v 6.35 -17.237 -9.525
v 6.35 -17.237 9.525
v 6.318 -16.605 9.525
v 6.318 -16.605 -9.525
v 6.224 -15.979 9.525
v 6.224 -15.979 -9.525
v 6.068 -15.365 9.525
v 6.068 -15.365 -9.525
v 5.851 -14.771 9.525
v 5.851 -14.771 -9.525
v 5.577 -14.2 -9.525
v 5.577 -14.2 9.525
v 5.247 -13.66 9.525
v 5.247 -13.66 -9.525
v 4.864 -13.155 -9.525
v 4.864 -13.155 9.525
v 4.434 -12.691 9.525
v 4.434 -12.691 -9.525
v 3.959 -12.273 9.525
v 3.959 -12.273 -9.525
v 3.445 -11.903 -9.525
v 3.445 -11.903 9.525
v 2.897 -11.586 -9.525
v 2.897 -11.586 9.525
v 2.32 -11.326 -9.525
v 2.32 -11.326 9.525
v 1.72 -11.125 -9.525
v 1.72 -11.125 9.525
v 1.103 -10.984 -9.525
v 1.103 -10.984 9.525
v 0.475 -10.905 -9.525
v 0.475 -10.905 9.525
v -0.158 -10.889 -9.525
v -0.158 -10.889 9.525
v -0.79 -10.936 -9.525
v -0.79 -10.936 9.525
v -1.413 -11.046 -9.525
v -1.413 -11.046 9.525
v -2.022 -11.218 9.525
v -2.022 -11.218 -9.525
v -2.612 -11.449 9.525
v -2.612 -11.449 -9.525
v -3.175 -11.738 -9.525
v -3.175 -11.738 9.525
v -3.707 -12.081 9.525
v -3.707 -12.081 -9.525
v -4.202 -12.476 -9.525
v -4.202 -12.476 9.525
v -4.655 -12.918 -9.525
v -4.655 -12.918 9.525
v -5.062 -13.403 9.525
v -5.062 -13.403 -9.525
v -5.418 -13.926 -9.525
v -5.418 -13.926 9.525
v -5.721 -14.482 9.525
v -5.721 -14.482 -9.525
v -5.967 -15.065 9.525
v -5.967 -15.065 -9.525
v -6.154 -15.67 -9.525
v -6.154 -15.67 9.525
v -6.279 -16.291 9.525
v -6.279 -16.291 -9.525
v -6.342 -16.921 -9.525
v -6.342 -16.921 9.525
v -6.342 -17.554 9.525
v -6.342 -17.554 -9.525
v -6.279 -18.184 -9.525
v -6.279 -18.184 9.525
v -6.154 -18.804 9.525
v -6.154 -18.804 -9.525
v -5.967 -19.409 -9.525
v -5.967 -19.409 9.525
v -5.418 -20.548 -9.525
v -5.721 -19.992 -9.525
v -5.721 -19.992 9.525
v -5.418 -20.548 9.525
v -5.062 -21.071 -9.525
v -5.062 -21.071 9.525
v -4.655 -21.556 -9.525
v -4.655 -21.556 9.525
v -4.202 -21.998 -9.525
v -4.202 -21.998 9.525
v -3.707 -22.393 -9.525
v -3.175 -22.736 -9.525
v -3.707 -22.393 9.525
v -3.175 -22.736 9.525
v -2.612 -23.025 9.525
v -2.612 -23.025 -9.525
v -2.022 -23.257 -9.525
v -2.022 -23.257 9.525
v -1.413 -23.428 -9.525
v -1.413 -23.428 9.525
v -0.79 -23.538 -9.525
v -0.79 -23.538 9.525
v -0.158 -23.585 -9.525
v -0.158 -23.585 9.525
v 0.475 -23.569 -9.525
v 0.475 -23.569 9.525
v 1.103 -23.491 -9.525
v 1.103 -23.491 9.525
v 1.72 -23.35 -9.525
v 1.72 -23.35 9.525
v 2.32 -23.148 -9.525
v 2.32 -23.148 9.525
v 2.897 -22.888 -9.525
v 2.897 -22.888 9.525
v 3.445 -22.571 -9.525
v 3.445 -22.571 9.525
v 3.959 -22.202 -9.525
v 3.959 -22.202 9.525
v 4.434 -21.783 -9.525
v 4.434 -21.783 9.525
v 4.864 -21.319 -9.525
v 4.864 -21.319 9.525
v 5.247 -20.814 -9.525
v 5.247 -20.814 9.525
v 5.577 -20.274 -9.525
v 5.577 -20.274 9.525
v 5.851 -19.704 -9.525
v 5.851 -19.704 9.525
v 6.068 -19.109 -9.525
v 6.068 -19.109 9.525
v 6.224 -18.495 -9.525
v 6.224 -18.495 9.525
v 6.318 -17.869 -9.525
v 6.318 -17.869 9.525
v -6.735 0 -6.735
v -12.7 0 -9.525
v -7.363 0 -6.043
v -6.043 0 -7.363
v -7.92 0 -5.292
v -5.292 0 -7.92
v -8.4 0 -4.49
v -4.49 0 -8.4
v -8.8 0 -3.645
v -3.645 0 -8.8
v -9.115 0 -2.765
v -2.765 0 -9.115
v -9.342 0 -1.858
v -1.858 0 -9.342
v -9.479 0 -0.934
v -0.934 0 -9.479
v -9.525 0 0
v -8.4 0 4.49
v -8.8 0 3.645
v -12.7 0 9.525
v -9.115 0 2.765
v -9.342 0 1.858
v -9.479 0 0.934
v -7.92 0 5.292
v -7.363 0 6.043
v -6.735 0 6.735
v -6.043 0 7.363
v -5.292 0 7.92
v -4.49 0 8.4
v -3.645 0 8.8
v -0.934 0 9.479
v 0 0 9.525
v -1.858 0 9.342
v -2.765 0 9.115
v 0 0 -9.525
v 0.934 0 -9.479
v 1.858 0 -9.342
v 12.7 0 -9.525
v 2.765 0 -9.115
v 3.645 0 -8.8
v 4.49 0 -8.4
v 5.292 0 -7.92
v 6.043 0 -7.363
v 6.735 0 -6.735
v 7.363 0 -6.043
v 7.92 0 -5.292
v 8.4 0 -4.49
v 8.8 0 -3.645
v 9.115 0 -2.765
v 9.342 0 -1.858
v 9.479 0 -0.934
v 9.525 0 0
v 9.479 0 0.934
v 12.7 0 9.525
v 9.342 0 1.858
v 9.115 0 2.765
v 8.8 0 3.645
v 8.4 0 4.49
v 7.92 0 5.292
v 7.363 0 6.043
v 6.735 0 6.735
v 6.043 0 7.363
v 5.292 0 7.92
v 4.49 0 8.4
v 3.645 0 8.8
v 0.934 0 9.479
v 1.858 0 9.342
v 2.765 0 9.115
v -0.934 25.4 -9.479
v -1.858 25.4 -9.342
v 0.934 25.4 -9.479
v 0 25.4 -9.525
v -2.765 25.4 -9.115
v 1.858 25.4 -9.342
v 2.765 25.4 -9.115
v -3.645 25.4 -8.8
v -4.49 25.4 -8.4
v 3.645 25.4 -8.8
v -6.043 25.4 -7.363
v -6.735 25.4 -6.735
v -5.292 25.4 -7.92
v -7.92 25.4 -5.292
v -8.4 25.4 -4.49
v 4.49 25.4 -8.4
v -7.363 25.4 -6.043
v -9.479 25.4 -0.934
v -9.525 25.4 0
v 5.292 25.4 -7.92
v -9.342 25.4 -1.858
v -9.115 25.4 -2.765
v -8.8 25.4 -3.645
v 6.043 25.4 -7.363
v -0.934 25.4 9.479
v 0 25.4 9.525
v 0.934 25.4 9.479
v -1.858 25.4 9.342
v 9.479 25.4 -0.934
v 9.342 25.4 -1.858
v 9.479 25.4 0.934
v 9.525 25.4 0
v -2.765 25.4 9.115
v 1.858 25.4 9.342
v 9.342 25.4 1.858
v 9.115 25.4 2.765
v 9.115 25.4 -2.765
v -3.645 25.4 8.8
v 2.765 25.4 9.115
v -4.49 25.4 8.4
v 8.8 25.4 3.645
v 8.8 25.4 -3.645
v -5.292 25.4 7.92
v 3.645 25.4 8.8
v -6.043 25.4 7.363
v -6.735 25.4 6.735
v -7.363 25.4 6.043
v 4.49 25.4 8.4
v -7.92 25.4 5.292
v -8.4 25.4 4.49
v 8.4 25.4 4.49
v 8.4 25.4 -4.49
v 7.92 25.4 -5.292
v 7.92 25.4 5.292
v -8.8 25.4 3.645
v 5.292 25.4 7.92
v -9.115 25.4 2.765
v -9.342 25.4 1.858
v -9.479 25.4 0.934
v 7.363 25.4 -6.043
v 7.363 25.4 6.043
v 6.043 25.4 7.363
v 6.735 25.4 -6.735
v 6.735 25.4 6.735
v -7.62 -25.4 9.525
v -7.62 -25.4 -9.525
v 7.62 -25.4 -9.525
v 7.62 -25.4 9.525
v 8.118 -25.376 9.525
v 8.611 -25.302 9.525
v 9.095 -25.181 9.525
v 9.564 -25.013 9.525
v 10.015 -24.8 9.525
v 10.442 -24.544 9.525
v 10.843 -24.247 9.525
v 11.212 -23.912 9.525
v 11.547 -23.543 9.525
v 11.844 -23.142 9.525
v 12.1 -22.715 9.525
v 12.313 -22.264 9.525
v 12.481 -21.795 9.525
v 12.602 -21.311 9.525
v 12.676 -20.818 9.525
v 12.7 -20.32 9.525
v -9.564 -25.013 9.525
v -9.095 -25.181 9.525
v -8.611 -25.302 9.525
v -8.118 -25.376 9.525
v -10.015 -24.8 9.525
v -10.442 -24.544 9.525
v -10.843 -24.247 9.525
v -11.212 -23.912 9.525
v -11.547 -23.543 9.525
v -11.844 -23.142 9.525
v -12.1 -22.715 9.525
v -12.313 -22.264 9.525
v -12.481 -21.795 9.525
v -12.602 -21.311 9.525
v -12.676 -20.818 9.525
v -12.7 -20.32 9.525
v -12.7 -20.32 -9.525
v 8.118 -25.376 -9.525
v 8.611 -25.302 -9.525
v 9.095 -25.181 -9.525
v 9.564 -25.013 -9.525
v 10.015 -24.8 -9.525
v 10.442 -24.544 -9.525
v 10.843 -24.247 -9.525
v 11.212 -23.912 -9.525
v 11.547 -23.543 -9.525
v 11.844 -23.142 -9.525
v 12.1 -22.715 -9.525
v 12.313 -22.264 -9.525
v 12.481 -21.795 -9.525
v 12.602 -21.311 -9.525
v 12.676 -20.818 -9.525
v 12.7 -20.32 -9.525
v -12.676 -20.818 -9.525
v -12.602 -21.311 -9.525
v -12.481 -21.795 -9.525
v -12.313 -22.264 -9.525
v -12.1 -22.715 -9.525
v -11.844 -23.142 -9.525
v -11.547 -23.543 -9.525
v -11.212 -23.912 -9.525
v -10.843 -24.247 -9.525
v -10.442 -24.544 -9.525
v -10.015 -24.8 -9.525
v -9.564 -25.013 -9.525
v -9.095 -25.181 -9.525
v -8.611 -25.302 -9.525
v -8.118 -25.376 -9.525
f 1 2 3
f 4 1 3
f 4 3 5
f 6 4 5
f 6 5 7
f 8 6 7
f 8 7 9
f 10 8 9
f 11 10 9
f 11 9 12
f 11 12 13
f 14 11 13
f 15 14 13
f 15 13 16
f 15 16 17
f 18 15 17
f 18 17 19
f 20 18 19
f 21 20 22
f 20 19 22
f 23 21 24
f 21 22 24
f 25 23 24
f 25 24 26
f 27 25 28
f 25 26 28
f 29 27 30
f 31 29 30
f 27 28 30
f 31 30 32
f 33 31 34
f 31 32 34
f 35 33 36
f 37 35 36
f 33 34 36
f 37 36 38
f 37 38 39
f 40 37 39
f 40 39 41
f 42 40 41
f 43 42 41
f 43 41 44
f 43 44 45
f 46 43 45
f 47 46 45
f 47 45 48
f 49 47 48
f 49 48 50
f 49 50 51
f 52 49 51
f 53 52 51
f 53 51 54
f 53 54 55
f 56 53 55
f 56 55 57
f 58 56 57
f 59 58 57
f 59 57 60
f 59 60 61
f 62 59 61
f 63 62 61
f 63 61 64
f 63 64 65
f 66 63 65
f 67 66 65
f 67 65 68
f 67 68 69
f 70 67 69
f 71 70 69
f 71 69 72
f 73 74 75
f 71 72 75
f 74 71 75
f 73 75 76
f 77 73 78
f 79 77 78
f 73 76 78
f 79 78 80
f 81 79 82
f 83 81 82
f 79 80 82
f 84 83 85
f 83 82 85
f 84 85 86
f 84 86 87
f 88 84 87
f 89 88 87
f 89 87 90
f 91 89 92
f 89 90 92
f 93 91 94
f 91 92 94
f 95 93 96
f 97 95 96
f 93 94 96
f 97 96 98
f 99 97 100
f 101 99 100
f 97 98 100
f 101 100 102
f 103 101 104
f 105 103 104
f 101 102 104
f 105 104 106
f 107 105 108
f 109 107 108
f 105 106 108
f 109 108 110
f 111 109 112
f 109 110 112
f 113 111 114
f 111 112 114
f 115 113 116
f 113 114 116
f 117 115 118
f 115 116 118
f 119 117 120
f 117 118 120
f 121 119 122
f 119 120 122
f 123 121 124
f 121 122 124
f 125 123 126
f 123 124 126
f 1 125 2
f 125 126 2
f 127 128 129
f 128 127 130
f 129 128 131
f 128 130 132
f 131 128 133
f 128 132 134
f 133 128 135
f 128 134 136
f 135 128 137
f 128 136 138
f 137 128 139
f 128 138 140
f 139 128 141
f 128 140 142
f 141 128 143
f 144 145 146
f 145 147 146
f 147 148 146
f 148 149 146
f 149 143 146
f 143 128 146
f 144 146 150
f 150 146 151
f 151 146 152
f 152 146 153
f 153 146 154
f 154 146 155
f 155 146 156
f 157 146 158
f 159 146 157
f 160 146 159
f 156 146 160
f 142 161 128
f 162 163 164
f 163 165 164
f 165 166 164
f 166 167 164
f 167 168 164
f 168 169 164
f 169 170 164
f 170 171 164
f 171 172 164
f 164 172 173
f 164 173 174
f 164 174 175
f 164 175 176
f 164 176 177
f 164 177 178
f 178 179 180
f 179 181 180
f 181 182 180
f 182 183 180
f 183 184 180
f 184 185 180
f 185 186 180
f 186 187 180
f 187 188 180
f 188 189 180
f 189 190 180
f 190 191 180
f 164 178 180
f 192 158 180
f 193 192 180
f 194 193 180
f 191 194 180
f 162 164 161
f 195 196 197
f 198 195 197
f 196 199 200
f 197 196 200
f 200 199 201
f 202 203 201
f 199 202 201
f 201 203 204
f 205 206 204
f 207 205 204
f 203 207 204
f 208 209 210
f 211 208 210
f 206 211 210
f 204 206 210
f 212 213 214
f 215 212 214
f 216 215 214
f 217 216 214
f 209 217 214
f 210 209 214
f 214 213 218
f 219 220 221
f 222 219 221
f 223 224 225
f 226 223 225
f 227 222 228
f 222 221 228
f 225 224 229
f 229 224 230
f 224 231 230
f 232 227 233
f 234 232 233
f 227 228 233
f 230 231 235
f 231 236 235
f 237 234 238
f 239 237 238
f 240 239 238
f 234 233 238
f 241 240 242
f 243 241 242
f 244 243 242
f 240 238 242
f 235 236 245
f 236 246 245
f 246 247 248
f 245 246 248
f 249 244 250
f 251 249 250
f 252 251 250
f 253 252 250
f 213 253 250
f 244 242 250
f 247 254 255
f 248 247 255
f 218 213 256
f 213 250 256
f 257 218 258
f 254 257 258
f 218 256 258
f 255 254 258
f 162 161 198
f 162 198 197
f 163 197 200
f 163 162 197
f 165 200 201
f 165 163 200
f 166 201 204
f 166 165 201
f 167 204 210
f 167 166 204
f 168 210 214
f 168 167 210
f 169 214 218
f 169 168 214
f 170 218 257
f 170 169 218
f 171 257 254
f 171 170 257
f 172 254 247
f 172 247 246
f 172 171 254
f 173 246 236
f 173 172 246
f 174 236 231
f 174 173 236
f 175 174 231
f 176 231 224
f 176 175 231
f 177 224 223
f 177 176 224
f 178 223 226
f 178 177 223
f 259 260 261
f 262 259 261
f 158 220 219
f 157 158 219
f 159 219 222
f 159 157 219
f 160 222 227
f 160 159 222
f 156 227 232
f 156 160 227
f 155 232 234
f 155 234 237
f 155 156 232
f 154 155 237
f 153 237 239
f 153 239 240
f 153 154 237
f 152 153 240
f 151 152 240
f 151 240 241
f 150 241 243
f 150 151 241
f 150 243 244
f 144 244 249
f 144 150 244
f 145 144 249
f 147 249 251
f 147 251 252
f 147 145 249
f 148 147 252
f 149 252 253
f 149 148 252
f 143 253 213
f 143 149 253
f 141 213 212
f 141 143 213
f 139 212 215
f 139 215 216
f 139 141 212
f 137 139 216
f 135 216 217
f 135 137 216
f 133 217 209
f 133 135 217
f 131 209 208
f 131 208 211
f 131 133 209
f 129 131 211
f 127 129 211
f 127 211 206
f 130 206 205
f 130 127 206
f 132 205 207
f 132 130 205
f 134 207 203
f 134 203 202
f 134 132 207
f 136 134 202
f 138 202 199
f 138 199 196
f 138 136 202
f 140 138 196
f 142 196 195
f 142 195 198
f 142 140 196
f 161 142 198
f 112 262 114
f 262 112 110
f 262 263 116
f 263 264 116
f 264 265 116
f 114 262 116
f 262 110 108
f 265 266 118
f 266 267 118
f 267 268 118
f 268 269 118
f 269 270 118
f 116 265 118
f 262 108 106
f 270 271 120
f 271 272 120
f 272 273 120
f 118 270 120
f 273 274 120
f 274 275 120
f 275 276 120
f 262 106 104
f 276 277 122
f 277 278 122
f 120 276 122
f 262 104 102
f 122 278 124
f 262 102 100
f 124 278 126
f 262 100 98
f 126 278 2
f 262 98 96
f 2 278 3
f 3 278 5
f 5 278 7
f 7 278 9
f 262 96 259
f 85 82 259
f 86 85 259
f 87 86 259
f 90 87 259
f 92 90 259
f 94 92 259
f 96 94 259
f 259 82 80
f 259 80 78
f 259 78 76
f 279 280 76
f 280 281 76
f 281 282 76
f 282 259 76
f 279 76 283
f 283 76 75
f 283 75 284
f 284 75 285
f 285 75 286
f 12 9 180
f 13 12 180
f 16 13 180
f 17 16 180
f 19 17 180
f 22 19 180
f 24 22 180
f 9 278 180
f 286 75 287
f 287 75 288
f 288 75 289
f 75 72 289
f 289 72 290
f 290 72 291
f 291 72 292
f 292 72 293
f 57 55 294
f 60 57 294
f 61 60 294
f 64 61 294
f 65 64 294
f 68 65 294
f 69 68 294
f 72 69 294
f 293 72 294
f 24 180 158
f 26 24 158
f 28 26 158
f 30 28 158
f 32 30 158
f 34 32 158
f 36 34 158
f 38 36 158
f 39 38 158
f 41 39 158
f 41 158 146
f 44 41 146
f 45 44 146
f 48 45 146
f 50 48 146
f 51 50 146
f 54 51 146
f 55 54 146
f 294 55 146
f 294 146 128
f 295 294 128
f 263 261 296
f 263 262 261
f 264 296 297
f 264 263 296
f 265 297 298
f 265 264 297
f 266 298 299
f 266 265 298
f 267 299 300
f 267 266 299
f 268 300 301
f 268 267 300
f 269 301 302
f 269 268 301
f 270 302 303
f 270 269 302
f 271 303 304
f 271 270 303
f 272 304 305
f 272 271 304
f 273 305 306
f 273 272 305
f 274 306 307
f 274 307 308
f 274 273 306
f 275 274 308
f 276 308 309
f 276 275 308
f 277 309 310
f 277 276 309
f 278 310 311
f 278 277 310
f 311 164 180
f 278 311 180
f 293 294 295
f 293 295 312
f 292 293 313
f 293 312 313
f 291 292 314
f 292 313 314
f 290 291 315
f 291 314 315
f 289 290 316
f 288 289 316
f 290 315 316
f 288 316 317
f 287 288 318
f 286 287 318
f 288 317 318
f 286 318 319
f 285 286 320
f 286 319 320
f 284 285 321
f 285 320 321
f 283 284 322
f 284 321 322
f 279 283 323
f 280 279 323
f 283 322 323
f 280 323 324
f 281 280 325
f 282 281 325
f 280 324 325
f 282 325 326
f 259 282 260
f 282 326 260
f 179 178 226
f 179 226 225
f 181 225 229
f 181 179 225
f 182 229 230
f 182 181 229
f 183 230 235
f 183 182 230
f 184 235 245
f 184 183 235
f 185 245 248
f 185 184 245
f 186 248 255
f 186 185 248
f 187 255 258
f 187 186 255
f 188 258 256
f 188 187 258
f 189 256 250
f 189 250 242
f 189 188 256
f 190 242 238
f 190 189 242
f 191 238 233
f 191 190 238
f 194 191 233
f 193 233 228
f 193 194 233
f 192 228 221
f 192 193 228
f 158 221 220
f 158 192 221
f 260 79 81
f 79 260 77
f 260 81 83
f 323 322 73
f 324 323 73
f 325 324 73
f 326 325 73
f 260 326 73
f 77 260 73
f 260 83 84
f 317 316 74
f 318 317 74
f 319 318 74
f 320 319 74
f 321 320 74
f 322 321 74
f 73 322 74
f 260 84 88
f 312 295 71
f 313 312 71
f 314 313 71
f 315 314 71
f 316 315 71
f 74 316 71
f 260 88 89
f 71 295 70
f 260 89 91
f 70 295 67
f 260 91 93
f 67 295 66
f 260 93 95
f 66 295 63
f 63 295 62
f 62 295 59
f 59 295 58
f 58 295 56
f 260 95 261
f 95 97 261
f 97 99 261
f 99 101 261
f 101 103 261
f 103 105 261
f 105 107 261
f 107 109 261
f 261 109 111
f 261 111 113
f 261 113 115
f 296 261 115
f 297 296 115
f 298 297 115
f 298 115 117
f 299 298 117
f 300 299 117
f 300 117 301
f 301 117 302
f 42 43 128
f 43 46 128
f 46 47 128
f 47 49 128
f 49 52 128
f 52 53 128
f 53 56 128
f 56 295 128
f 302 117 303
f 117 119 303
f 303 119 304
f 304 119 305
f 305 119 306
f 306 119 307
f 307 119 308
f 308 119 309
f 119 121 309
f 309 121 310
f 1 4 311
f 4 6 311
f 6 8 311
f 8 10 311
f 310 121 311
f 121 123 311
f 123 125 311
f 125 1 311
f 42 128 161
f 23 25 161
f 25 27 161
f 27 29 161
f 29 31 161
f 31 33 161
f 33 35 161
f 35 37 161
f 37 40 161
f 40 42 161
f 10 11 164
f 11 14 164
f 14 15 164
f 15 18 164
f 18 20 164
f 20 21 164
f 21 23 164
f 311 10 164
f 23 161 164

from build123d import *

# Parameters (mm, degrees)
F1_DEPTH = 25.4
F2_DEPTH = 25.4
F3_R     = 6.35
F4_DEPTH = 25.4
F5_R     = 5.08


with BuildPart() as f1:
    # F0 (on Front) → F1 (new body)
    with BuildSketch(Plane.XZ):
        with BuildLine():
            ThreePointArc((0, 9.525), (-9.525, 0), (0, -9.525))
            ThreePointArc((0, -9.525), (6.735192, -6.735192), (9.525, 0))
            ThreePointArc((9.525, 0), (6.735192, 6.735192), (0, 9.525))
        make_face()
    extrude(amount=-F1_DEPTH)

    # F0 (on Front) → F2 (join)
    with BuildSketch(Plane.XZ):
        with BuildLine():
            Line((-12.7, 9.525), (-12.7, -9.525))
            Line((-12.7, -9.525), (0, -9.525))
            ThreePointArc((0, -9.525), (-9.525, 0), (0, 9.525))
            Line((0, 9.525), (-12.7, 9.525))
        make_face()
        with BuildLine():
            ThreePointArc((9.525, 0), (6.735192, -6.735192), (0, -9.525))
            Line((0, -9.525), (12.7, -9.525))
            Line((12.7, -9.525), (12.7, 9.525))
            Line((12.7, 9.525), (0, 9.525))
            ThreePointArc((0, 9.525), (6.735192, 6.735192), (9.525, 0))
        make_face()
        with BuildLine():
            ThreePointArc((0, 9.525), (-9.525, 0), (0, -9.525))
            ThreePointArc((0, -9.525), (6.735192, -6.735192), (9.525, 0))
            ThreePointArc((9.525, 0), (6.735192, 6.735192), (0, 9.525))
        make_face()
    extrude(amount=F2_DEPTH)

    # F3 (on face) → F4 (cut)
    with BuildSketch(Plane.XY.offset(9.525)):
        with Locations((0, -17.237177)):
            Circle(F3_R)
    extrude(amount=-F4_DEPTH, mode=Mode.SUBTRACT)

    # F5
    f5_edges = [f1.edges().sort_by_distance(p)[0] for p in [
        (-12.7, -25.4, 0),
        (12.7, -25.4, 0),
    ]]
    fillet(f5_edges, radius=F5_R)


solid = f1.part
